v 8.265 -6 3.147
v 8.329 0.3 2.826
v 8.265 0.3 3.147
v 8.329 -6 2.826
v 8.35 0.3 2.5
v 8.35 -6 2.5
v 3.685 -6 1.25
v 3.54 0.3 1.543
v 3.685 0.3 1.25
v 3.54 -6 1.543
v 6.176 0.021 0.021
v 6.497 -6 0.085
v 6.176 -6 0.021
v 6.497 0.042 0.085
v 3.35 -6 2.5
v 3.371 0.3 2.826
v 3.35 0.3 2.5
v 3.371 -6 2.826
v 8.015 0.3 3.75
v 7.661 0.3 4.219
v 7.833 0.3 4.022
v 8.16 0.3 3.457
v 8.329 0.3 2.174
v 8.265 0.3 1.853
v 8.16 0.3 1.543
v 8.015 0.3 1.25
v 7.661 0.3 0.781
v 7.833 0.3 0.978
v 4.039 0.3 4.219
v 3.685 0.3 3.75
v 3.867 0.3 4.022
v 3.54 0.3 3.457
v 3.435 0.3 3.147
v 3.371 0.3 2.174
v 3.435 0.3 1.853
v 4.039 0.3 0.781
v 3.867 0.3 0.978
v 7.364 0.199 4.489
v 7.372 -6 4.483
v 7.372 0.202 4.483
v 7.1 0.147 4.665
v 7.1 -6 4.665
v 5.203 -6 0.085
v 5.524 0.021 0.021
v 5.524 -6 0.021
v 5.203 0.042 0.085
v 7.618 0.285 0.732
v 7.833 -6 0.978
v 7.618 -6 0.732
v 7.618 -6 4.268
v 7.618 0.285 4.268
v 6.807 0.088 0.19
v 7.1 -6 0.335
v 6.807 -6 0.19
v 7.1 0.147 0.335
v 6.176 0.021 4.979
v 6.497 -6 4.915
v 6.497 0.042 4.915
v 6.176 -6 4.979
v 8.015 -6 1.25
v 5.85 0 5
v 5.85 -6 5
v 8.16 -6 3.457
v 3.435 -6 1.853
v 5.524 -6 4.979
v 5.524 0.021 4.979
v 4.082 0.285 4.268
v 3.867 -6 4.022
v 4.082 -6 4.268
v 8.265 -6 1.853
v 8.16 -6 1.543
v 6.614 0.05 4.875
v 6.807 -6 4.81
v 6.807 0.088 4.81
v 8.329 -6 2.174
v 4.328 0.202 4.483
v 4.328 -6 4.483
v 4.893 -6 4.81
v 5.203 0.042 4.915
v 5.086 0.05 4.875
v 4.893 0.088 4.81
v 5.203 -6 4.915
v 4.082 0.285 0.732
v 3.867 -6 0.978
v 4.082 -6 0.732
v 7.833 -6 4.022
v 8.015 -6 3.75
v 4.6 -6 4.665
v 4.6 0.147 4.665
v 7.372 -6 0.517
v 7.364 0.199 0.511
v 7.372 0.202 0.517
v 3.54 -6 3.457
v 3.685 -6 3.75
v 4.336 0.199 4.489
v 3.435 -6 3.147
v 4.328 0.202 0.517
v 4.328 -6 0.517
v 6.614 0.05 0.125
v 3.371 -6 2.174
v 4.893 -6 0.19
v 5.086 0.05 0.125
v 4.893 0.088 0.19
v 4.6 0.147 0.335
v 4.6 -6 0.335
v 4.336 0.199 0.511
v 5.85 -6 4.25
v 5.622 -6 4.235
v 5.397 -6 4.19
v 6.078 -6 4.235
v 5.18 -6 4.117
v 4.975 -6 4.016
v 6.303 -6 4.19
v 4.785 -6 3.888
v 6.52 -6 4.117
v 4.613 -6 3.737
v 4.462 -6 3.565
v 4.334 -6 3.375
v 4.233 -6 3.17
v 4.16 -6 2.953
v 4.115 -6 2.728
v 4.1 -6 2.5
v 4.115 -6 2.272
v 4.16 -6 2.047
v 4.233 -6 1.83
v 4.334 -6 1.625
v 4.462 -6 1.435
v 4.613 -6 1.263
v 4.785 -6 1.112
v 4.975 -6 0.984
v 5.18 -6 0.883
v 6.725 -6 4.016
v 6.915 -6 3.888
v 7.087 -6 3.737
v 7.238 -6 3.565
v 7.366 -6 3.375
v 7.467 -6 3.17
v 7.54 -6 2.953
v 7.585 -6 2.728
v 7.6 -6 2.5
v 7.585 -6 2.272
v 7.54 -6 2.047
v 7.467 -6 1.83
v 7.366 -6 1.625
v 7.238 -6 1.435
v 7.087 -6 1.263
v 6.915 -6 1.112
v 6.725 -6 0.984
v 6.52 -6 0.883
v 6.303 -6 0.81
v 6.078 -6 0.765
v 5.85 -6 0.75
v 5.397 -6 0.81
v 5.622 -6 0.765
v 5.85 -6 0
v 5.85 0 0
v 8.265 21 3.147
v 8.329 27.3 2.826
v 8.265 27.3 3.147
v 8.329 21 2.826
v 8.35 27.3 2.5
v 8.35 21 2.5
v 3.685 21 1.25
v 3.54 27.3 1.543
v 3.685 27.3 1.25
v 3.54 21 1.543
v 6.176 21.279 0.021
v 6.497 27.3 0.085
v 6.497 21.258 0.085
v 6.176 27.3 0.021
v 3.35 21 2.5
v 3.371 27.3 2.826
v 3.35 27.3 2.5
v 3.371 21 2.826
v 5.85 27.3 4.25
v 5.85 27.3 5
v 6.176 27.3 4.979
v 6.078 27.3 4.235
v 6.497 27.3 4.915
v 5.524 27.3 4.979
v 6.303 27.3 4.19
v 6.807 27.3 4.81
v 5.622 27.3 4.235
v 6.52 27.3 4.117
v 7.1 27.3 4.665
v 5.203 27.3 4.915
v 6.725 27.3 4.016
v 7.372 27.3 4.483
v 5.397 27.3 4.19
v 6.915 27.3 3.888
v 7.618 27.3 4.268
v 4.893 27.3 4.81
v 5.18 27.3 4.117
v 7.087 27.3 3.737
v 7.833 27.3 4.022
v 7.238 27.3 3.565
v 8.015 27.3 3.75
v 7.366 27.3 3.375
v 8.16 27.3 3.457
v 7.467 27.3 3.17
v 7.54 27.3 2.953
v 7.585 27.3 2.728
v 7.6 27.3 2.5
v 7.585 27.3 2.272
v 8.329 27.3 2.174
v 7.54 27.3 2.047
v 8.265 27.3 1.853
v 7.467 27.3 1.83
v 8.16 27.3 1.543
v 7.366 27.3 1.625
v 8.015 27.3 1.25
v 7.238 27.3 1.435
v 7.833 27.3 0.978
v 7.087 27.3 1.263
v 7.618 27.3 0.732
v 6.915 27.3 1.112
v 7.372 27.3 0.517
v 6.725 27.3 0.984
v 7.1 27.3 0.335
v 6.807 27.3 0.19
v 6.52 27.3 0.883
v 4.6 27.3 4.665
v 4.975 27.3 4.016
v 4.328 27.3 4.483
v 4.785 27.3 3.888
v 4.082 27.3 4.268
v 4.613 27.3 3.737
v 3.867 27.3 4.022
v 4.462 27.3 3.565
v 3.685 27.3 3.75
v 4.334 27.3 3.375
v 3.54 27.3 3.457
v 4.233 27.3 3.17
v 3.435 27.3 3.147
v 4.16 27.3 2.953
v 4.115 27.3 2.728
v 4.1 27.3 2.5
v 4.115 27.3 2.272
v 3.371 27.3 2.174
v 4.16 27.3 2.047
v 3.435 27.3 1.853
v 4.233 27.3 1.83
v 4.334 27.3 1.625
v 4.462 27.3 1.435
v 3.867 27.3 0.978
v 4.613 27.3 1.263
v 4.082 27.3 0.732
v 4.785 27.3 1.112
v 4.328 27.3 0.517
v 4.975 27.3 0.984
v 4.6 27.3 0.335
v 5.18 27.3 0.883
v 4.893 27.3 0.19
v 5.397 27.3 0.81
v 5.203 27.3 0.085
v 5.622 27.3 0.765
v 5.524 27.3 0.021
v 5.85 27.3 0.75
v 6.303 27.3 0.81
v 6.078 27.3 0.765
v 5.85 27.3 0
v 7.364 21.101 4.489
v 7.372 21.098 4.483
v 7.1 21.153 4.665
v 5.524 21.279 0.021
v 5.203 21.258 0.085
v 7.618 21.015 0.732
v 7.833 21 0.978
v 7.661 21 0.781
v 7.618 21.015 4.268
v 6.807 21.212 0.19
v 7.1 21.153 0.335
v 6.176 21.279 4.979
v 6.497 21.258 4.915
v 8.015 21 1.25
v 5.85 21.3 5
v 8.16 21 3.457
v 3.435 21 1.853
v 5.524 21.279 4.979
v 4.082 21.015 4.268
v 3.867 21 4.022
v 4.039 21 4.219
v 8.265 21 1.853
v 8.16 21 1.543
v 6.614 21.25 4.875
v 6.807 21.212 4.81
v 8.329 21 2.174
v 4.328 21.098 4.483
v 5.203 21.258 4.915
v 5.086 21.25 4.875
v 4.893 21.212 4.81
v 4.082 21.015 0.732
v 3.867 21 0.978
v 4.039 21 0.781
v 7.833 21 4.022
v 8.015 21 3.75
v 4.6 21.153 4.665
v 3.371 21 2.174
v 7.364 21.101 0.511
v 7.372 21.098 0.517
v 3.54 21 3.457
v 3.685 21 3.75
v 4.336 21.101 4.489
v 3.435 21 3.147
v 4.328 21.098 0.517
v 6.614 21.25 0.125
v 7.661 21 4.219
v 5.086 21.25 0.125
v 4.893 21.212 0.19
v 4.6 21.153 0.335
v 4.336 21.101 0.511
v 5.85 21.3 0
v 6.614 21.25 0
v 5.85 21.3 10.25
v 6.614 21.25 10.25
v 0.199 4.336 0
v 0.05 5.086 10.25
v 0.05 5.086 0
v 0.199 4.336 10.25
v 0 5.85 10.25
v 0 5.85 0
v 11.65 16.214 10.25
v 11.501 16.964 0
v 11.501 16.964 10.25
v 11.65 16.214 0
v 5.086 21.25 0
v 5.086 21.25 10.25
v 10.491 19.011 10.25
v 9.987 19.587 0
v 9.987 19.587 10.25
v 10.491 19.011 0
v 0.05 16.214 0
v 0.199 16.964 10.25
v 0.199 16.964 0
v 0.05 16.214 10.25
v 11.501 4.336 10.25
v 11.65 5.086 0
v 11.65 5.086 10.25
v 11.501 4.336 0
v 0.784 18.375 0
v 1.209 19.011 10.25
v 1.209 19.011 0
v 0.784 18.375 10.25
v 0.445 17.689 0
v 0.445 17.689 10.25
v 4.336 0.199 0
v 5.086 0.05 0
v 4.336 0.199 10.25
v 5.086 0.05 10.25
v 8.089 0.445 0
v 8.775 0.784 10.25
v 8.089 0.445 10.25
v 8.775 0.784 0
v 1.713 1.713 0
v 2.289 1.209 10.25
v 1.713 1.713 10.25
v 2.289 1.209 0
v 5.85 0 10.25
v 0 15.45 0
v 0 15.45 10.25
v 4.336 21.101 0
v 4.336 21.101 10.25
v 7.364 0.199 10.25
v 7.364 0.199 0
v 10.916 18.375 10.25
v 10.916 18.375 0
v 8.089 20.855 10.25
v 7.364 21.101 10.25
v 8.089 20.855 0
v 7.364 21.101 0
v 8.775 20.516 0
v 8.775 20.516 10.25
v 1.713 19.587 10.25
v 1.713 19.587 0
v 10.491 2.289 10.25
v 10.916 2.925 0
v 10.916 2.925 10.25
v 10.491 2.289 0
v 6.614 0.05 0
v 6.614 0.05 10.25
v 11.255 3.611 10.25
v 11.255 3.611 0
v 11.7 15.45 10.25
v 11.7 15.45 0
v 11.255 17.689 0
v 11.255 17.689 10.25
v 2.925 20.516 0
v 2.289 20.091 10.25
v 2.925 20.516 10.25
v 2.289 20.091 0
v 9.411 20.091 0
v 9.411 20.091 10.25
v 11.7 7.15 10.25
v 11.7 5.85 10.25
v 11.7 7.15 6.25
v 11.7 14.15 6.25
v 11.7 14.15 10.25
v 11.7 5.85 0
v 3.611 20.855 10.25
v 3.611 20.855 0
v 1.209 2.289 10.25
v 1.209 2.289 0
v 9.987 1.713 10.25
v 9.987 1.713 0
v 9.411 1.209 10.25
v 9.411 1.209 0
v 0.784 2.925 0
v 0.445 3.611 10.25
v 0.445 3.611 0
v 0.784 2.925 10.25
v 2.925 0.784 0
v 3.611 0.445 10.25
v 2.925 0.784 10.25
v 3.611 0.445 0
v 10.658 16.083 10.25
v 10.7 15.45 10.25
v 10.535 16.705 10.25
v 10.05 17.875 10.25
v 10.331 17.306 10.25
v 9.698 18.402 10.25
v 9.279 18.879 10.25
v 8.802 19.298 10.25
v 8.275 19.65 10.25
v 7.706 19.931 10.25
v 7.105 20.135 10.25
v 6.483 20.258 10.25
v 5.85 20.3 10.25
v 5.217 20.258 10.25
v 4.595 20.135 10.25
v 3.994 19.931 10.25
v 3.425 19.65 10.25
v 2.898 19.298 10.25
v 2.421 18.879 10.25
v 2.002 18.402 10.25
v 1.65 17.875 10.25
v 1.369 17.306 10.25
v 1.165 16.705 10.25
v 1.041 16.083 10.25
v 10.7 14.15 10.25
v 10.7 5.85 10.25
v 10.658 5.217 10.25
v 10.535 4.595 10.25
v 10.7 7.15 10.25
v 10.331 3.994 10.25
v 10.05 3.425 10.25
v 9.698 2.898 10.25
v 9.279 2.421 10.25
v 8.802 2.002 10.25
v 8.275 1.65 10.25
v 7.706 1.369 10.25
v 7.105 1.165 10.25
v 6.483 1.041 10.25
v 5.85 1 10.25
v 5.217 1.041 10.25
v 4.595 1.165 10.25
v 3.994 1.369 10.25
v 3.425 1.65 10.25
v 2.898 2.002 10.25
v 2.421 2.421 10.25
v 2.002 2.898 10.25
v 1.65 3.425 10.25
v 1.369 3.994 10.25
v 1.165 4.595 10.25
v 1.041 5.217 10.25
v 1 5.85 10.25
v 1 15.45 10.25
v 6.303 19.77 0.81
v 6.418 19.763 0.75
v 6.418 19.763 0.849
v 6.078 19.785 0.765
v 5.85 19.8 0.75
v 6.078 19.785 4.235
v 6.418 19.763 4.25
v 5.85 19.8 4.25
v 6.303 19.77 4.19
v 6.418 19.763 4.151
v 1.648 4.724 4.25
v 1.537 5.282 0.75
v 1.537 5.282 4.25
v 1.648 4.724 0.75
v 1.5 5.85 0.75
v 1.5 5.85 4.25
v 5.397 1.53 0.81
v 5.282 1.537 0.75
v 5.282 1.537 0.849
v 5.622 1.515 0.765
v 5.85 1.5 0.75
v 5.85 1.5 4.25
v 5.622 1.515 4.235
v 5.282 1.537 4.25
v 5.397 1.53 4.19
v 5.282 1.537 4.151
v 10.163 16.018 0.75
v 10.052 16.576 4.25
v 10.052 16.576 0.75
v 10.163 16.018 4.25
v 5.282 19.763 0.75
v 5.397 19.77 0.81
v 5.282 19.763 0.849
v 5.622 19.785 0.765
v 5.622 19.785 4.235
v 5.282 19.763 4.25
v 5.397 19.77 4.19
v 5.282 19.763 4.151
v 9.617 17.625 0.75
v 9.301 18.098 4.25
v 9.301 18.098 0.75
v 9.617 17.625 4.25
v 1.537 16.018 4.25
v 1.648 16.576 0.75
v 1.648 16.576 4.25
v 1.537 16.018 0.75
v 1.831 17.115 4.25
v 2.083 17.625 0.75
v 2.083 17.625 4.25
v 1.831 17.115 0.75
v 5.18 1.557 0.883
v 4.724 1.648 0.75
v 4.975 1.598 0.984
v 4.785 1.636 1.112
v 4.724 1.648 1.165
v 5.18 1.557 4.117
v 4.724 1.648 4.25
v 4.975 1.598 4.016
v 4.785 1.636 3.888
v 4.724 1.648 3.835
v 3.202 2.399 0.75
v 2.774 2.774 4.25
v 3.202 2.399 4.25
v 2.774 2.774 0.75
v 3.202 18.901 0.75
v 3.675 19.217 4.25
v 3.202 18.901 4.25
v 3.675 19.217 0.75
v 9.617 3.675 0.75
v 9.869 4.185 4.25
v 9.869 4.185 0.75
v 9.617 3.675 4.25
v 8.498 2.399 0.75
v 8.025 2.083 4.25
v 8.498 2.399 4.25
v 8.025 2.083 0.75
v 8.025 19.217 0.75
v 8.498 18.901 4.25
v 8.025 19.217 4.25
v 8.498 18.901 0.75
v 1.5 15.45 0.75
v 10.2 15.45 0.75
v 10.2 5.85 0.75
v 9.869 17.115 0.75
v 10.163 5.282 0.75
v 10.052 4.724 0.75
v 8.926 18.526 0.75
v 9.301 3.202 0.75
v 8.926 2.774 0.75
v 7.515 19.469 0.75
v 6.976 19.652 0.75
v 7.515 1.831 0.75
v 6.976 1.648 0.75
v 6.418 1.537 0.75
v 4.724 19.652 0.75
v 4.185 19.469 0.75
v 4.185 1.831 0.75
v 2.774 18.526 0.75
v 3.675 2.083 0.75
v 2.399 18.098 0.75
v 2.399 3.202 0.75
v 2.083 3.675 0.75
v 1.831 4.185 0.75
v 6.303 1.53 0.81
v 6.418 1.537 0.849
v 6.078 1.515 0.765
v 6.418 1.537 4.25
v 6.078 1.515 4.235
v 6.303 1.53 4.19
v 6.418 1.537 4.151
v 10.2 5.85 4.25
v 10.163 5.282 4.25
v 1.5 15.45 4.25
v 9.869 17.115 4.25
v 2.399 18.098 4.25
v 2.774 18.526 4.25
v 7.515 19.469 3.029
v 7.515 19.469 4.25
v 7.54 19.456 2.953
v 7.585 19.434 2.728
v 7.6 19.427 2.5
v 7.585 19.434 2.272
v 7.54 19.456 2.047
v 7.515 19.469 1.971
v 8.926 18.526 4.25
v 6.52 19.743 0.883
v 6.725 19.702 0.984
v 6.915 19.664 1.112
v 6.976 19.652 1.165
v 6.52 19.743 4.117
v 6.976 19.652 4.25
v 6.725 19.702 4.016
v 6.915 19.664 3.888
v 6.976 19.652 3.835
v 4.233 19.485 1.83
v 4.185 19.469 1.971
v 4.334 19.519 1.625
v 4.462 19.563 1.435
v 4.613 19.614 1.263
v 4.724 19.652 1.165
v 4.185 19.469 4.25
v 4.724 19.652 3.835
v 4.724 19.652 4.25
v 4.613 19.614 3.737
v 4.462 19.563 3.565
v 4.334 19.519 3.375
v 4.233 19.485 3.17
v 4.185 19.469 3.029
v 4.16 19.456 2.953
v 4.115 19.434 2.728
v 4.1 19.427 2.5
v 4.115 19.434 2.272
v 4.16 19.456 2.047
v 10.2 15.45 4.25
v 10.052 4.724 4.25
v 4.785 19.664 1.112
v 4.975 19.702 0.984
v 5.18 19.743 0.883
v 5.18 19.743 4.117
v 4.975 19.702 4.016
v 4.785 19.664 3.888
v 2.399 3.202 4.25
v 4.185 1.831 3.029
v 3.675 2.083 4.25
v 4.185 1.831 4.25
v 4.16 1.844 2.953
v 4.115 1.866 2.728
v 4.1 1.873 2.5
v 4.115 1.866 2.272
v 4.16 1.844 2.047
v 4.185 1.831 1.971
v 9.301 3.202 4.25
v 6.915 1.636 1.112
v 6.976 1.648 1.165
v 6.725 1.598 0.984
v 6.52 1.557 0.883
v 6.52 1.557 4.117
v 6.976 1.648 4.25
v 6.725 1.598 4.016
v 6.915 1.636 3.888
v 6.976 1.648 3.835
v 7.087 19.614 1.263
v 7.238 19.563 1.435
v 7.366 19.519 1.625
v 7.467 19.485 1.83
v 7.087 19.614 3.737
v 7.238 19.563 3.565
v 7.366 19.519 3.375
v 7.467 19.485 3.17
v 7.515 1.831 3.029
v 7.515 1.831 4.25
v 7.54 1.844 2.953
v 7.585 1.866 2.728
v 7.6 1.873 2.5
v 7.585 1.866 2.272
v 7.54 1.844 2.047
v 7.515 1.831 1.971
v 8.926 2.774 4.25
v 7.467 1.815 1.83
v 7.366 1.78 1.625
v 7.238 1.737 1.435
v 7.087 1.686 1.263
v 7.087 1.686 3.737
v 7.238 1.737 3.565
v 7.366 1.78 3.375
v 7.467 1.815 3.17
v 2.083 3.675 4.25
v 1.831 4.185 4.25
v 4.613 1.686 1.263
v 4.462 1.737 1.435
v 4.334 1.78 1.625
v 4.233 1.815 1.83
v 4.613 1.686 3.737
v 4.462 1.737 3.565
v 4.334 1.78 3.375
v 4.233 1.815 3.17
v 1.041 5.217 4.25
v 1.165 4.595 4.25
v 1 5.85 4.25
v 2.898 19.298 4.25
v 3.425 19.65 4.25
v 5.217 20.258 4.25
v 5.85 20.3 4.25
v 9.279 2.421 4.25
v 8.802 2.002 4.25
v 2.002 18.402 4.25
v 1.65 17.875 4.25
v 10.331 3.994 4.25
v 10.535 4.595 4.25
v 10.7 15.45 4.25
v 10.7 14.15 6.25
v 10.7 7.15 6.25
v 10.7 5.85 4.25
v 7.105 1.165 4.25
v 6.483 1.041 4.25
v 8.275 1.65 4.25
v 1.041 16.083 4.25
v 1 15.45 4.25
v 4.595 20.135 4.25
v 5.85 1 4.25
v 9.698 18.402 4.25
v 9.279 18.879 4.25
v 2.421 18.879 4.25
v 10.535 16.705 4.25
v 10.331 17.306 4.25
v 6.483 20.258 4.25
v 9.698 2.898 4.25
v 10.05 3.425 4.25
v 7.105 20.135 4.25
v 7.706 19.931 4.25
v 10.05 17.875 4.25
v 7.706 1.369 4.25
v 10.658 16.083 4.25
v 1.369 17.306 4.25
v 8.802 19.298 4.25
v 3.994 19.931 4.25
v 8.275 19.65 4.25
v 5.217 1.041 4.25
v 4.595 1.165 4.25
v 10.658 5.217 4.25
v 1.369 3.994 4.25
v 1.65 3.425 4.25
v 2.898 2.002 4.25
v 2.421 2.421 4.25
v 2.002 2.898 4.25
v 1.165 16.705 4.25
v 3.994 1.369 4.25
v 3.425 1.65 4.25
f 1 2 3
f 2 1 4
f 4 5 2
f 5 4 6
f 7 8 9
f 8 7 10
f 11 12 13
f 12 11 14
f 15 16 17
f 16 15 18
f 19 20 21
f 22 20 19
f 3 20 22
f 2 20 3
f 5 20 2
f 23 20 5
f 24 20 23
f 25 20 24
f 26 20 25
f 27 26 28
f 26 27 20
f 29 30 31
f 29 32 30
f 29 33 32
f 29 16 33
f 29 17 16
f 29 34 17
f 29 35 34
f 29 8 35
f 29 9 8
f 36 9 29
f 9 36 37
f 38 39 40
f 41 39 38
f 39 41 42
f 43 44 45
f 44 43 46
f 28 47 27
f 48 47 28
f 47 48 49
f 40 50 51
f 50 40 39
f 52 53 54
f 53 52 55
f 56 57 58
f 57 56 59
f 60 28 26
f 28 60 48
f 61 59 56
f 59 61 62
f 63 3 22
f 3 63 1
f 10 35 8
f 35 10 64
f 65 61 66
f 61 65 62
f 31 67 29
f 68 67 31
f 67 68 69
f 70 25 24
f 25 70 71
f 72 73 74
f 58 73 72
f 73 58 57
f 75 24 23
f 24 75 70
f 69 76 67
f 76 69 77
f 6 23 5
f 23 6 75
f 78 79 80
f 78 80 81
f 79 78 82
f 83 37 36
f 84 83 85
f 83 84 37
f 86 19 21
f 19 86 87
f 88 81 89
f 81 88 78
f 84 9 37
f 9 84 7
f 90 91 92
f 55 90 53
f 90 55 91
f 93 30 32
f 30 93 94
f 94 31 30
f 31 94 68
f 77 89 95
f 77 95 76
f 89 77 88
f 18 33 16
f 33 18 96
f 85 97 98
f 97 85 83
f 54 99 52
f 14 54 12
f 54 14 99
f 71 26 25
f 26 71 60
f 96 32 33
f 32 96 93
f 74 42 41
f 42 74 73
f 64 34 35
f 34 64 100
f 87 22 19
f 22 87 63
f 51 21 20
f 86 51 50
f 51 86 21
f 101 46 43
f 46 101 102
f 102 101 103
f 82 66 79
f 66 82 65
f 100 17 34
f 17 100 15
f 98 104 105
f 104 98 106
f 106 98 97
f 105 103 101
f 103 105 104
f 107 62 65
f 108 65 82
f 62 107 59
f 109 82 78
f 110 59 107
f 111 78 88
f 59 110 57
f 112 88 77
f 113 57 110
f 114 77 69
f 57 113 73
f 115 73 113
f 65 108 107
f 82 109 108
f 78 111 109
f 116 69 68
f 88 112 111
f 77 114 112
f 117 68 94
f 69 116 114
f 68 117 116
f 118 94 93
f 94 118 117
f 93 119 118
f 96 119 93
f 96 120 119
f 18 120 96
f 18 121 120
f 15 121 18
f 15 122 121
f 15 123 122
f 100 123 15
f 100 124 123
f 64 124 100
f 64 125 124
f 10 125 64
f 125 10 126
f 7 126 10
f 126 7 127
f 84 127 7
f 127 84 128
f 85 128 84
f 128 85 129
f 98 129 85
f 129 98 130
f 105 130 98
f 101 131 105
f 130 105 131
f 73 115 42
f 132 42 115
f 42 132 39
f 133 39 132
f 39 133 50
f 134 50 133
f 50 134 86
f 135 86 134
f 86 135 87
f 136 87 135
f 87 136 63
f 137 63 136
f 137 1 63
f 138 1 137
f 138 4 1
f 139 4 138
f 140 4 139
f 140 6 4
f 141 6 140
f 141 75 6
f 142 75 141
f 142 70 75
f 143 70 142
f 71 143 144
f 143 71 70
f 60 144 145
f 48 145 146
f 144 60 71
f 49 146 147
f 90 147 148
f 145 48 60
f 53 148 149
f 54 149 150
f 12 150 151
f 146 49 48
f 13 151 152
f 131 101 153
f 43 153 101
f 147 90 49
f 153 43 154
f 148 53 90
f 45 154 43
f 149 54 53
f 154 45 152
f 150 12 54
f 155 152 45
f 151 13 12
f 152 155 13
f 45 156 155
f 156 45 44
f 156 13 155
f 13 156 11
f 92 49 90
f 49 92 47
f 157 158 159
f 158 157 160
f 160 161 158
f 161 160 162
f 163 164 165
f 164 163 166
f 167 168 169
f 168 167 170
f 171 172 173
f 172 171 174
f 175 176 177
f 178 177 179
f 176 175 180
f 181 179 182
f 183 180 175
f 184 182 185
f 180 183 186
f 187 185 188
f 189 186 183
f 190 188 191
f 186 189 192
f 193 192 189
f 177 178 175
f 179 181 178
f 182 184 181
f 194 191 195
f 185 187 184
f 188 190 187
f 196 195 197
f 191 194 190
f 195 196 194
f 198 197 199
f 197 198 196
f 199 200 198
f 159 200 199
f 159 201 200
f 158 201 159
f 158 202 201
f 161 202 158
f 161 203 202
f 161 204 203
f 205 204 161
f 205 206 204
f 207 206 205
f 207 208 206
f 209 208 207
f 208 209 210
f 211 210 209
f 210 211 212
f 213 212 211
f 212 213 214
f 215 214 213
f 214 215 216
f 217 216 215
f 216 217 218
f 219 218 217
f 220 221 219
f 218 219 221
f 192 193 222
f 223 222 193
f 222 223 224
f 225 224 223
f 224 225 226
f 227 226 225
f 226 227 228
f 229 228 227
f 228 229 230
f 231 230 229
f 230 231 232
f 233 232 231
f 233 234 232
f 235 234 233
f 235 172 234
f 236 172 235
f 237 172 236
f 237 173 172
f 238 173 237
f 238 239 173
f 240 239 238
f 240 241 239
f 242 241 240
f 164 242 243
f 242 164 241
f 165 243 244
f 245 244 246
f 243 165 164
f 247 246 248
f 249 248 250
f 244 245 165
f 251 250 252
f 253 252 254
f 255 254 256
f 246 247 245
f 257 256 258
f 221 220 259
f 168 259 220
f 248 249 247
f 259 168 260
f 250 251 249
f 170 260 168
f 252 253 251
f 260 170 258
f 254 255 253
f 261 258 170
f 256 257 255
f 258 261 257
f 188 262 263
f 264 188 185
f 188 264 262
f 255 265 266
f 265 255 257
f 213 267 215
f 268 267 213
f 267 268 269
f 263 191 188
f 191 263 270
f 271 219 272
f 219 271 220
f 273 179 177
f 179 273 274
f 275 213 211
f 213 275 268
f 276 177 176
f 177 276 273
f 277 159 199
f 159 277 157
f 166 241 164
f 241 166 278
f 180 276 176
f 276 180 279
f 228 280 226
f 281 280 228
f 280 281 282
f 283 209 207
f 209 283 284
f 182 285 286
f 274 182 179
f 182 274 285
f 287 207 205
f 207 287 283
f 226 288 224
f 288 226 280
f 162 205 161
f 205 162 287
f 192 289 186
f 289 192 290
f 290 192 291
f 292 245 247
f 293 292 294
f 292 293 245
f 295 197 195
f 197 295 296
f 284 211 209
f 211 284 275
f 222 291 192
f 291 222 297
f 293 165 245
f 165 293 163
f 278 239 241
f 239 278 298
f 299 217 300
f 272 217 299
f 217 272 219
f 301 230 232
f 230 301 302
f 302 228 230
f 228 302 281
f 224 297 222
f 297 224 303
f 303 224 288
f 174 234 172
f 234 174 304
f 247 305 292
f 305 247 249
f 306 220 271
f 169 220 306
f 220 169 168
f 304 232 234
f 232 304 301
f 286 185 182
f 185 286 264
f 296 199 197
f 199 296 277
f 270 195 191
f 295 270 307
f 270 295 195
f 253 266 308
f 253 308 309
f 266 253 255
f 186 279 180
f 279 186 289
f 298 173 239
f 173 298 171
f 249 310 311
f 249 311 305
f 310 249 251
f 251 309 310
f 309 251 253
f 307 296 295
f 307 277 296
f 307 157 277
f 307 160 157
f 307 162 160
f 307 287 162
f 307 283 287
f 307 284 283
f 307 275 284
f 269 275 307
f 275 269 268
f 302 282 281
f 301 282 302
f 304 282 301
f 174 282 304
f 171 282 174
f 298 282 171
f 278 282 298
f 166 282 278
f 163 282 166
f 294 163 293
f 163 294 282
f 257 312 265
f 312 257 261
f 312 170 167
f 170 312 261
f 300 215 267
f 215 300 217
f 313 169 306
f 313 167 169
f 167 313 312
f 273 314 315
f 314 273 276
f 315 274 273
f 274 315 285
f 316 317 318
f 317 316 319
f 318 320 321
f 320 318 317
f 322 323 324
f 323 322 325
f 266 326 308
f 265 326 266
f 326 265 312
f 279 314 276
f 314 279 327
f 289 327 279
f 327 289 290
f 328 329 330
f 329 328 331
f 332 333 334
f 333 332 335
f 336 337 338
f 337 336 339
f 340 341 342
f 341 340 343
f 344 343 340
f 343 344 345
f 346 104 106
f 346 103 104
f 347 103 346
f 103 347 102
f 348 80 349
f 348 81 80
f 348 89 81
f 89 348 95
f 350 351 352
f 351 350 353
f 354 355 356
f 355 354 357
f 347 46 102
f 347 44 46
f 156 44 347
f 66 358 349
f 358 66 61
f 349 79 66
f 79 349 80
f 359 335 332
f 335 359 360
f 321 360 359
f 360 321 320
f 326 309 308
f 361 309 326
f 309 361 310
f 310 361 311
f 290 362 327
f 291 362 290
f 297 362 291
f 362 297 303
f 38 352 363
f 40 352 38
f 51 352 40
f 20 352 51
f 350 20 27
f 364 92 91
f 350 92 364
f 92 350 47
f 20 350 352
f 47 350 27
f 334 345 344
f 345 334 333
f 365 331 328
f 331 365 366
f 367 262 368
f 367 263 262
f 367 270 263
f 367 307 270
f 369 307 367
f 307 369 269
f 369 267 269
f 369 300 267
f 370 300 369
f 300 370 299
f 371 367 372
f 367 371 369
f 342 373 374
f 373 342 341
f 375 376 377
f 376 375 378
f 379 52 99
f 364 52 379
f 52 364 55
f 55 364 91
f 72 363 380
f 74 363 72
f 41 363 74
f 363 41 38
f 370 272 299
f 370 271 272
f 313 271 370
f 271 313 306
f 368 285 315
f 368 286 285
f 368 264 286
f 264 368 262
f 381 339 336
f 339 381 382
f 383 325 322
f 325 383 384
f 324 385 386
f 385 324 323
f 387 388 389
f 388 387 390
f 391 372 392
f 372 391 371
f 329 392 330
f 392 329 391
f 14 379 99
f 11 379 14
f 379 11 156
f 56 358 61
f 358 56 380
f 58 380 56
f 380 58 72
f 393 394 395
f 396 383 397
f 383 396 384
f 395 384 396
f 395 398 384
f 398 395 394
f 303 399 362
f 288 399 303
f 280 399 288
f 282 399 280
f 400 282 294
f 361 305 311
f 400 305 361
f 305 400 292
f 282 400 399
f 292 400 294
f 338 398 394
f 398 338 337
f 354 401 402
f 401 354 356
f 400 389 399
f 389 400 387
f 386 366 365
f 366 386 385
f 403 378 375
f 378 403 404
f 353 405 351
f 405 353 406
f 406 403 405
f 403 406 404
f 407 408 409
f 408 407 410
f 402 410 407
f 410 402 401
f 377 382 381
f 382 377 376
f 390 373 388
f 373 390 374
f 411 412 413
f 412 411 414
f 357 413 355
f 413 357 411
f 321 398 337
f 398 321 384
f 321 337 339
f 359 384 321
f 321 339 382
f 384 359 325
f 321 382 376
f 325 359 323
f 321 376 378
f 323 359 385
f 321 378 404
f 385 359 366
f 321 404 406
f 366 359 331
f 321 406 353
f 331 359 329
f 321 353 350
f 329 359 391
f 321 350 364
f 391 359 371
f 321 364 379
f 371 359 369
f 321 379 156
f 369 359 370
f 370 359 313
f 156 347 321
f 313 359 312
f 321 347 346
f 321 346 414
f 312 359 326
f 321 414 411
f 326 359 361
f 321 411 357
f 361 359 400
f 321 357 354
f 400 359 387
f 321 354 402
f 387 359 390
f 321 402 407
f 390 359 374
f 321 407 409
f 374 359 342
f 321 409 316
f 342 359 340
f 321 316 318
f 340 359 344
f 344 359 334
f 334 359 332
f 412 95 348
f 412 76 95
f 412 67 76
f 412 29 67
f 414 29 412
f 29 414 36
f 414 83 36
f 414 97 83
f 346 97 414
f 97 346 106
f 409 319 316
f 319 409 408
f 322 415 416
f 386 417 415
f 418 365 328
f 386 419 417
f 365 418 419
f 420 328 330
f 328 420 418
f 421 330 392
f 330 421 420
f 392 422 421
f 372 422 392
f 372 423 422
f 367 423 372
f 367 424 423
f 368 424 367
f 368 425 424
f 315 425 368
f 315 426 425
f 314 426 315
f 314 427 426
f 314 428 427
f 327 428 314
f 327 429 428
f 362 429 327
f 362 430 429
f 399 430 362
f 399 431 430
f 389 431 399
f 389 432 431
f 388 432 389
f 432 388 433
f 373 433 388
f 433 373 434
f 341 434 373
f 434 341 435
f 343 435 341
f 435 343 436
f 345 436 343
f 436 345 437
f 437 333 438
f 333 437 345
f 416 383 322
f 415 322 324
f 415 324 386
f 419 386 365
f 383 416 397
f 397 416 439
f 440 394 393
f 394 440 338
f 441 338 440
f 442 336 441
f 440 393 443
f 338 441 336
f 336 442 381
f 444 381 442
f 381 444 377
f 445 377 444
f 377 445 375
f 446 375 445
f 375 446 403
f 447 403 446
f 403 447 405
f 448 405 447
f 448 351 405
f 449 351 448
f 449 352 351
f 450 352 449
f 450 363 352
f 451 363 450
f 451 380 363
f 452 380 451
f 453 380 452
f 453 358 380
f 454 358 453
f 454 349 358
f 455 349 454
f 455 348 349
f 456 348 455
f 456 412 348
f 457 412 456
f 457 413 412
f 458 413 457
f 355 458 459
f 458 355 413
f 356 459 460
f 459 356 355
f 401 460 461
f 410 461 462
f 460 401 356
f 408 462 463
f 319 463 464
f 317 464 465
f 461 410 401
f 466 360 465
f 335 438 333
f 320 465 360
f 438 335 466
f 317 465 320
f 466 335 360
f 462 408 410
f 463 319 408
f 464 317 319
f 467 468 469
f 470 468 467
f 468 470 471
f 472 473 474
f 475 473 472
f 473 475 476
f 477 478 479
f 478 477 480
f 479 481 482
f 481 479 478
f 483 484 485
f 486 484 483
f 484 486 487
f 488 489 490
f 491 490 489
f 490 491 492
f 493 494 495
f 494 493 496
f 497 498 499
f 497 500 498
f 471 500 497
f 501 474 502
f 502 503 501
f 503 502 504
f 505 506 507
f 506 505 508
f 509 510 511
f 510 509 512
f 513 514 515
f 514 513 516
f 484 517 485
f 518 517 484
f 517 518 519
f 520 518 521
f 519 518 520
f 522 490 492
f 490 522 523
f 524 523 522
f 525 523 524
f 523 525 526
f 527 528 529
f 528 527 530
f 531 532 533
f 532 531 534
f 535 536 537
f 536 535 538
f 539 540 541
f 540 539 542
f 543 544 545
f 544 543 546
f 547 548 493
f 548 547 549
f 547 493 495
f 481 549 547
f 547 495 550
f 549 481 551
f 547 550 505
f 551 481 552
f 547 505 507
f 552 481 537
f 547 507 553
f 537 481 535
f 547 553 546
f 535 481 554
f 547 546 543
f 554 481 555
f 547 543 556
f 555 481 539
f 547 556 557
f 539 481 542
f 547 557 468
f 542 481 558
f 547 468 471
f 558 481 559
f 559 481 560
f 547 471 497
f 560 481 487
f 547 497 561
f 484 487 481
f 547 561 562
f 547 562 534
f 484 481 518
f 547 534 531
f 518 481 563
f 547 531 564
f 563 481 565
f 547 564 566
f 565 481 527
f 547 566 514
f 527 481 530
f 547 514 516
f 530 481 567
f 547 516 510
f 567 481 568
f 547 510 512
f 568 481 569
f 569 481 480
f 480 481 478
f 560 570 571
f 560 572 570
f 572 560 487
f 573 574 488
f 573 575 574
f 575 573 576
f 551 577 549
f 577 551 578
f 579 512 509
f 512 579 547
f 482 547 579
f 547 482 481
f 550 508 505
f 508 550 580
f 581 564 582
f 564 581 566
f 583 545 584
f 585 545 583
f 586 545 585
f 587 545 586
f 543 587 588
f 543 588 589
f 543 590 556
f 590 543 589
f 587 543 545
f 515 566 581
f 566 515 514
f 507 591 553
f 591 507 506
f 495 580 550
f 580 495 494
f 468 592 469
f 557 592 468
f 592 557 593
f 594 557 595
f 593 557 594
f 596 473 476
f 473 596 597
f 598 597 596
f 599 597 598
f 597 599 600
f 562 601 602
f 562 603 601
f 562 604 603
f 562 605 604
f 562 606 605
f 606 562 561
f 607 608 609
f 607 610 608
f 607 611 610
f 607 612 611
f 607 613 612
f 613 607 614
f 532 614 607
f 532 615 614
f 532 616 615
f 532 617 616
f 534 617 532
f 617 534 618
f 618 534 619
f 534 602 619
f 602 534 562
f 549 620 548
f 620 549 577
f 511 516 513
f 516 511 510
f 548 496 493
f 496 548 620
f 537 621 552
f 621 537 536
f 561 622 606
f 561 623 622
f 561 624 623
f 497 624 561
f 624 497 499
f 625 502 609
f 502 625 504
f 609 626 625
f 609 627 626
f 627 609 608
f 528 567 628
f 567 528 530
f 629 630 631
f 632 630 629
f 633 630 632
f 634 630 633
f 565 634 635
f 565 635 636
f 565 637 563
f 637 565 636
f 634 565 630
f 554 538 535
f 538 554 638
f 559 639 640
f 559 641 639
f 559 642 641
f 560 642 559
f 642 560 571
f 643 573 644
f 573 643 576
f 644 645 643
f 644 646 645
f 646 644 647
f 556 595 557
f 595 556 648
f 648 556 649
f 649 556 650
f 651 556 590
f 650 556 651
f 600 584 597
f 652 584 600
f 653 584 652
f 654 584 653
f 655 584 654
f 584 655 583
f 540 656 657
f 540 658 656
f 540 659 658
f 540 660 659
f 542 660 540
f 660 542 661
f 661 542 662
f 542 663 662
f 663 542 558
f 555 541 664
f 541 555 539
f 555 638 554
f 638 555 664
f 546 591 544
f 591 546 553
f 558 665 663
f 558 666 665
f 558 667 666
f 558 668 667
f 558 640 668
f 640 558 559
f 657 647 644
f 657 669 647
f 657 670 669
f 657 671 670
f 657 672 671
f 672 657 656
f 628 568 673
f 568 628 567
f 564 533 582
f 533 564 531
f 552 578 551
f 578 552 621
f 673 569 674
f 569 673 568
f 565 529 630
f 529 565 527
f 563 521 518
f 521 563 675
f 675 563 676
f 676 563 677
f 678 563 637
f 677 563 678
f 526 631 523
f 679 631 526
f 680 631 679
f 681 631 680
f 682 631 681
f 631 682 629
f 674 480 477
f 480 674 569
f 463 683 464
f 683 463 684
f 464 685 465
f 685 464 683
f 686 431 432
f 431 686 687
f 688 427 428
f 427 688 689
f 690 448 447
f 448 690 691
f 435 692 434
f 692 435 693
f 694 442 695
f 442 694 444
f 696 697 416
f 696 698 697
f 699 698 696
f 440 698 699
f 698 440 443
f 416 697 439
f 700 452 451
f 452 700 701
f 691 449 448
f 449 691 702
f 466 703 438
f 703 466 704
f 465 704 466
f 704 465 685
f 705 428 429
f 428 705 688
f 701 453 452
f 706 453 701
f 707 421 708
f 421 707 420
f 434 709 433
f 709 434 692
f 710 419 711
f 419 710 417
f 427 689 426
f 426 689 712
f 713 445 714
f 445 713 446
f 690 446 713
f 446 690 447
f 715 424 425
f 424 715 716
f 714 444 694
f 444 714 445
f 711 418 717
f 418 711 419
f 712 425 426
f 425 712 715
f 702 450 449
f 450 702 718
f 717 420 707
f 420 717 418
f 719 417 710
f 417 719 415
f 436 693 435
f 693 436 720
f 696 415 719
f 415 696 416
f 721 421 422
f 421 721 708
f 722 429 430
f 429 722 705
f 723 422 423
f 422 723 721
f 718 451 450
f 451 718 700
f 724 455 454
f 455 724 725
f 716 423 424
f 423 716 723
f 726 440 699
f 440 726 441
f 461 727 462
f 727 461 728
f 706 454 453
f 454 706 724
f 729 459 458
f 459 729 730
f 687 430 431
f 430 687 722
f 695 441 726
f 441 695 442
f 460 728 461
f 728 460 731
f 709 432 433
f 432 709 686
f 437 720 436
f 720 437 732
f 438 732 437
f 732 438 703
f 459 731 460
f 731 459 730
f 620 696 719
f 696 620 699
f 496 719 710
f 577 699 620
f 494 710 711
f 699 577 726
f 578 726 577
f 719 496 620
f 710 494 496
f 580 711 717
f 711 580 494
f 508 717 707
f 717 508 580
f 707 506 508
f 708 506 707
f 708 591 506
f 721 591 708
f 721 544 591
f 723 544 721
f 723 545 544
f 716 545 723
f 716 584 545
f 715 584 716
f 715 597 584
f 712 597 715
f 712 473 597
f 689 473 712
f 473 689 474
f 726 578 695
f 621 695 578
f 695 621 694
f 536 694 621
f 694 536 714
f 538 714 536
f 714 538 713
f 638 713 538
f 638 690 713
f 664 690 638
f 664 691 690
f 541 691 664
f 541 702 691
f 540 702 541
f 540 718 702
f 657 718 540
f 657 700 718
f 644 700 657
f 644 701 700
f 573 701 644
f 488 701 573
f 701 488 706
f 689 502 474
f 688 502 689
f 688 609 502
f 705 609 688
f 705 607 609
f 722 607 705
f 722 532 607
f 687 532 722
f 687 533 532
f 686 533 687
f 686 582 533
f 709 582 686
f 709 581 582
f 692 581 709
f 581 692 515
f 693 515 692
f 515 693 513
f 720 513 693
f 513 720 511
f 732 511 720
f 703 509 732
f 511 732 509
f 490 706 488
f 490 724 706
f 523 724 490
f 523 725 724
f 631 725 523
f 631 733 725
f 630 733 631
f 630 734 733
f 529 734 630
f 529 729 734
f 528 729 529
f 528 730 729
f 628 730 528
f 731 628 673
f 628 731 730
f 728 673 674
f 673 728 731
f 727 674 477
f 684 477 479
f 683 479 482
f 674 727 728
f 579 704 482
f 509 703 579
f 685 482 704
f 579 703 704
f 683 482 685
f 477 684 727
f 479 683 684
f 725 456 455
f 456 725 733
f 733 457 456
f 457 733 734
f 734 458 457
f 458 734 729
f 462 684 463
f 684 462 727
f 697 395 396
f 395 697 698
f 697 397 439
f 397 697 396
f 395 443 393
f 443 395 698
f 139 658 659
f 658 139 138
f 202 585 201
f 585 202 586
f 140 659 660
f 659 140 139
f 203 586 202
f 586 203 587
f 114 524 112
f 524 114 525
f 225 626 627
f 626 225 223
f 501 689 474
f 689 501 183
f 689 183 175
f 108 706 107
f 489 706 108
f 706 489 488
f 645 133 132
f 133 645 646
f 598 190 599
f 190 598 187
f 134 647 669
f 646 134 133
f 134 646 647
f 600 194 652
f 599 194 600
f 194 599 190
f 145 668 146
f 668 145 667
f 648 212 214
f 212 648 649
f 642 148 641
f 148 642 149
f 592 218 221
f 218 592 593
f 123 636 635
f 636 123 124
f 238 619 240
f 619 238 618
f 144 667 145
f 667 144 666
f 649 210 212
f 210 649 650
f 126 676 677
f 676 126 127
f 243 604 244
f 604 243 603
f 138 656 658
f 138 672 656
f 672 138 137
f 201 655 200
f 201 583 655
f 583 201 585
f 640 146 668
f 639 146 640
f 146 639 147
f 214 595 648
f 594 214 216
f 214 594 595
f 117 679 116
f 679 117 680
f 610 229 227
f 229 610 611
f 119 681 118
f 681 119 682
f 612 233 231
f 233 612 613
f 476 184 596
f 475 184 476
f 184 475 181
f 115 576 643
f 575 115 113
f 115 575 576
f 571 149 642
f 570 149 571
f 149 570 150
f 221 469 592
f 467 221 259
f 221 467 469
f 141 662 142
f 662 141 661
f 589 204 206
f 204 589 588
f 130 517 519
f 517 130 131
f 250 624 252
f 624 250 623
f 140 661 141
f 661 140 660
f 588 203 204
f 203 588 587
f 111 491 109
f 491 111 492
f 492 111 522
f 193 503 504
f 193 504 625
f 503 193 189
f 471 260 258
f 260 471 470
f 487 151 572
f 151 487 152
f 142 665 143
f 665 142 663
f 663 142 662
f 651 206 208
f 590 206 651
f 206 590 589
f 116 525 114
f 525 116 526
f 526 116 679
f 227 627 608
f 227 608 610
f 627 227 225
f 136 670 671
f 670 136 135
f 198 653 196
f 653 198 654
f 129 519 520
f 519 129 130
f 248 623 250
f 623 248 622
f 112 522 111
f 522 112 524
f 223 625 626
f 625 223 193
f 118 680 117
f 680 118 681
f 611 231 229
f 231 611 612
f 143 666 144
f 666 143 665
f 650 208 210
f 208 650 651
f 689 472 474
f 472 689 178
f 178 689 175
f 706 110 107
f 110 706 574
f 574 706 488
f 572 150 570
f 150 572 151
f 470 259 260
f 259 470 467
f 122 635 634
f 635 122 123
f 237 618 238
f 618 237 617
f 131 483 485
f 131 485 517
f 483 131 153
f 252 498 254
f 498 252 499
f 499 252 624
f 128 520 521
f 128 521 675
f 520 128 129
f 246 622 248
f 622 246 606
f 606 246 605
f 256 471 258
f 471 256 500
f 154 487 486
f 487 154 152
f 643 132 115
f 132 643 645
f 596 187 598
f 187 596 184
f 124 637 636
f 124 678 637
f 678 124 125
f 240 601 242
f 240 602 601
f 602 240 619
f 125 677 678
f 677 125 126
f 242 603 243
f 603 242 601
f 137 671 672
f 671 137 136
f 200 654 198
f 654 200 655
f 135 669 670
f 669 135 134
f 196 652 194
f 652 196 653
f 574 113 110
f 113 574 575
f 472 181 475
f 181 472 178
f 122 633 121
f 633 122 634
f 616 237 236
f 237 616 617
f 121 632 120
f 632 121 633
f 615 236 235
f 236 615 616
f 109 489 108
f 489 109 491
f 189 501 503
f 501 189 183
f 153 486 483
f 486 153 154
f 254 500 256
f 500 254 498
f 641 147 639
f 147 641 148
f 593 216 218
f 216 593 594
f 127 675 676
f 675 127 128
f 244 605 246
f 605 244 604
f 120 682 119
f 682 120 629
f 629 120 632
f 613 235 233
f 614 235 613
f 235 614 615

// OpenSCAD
// Shallow flow chamber for the flat face of the helium sensor.
// The sensor face closes the open chamber side; gas flows across the whole face.
he_sensor_face_width = 9.7; // Sensor face width.
he_sensor_face_length = 19.3; // Sensor face length.
he_sensor_corner_diameter = he_sensor_face_width; // Diameter defining the rounded ends/corners.
sensor_body_clearance = 0; // Side clearance between the sensor body and retaining collar if needed
sensor_seat_overlap = 0.5; // Per-side ledge supporting the sensor face around the flow opening.
sensor_retainer_height = 6; // Collar height above the chamber that grips the sensor sides.
thermal_sensor_cutout_width = 7; // Opening width along the holder's long side.
thermal_sensor_cutout_start_above_collar = 2; // Opening starts this far above the collar base.

holder_wall = 1; // Wall thickness around the sensor face.
closed_end_thickness = 0.75; // Thickness of the chamber's closed back.
plenum_depth = 3.5; // Gap between the sensor face and the chamber back.

// Smooth spigots are provisional; size them to the flexible tubing.
tube_bore_diameter = 3.5; // Inside diameter of the tube ports and spigots.
tube_spigot_diameter = 5; // Outside diameter of each tube spigot.
tube_spigot_length = 6; // Length of each spigot beyond the holder end.
spigot_overlap = 0.3; // Amount each spigot overlaps the holder for a strong union.

chamber_width = he_sensor_face_width - 2 * sensor_seat_overlap; // Derived flow-opening width.
chamber_length = he_sensor_face_length - 2 * sensor_seat_overlap; // Derived flow-opening length.
chamber_corner_diameter = he_sensor_corner_diameter - 2 * sensor_seat_overlap; // Derived opening corner size.
sensor_cavity_width = he_sensor_face_width + 2 * sensor_body_clearance; // Derived collar opening width.
sensor_cavity_length = he_sensor_face_length + 2 * sensor_body_clearance; // Derived collar opening length.
sensor_cavity_corner_diameter = he_sensor_corner_diameter + 2 * sensor_body_clearance; // Derived collar opening corner size.
outer_width = he_sensor_face_width + 2 * holder_wall; // Derived holder outside width.
outer_length = he_sensor_face_length + 2 * holder_wall; // Derived holder outside length.
outer_corner_diameter = he_sensor_corner_diameter + 2 * holder_wall; // Derived holder corner size.
port_center_z = closed_end_thickness + plenum_depth / 2; // Tube-bore center height within the plenum.

module rounded_rectangle_2d(width, length, corner_diameter) {
    corner_radius = corner_diameter / 2;
    hull()
        for (y = [corner_radius, length - corner_radius])
            translate([width / 2, y]) circle(r = corner_radius, $fn = 48);
}

module rounded_rectangle_prism(width, length, corner_diameter, height) {
    linear_extrude(height = height)
        rounded_rectangle_2d(width, length, corner_diameter);
}

module he_sensor_holder() {
    difference() {
        union() {
            rounded_rectangle_prism(outer_width, outer_length, outer_corner_diameter,
                                    closed_end_thickness + plenum_depth);

            // Raised collar surrounds the sensor body above the gas chamber.
            translate([0, 0, closed_end_thickness + plenum_depth])
                rounded_rectangle_prism(outer_width, outer_length, outer_corner_diameter,
                                        sensor_retainer_height);

            // Inlet and outlet connect to opposite ends of the shallow chamber.
            for (side = [-1, 1])
                translate([outer_width / 2,
                           side < 0
                               ? -tube_spigot_length / 2 + spigot_overlap / 2
                               : outer_length + tube_spigot_length / 2 - spigot_overlap / 2,
                           port_center_z])
                    rotate([90, 0, 0])
                        cylinder(h = tube_spigot_length + spigot_overlap,
                                 d = tube_spigot_diameter, center = true, $fn = 48);
        }

        // Full-face plenum; the sensor face closes this opening when installed.
        translate([(outer_width - chamber_width) / 2,
               (outer_length - chamber_length) / 2,
                   closed_end_thickness])
            rounded_rectangle_prism(chamber_width, chamber_length,
                                    chamber_corner_diameter, plenum_depth + 0.1);

            // Sensor body slides through this collar opening and rests on the chamber ledge.
            translate([(outer_width - sensor_cavity_width) / 2,
                   (outer_length - sensor_cavity_length) / 2,
                   closed_end_thickness + plenum_depth])
                rounded_rectangle_prism(sensor_cavity_width, sensor_cavity_length,
                            sensor_cavity_corner_diameter, sensor_retainer_height + 0.1);

              // Side window lets a glued thermal sensor contact the helium sensor body.
              thermal_cutout_inner_x = (outer_width + sensor_cavity_width) / 2 - 0.1;
              translate([thermal_cutout_inner_x,
                     (outer_length - thermal_sensor_cutout_width) / 2,
                     closed_end_thickness + plenum_depth + thermal_sensor_cutout_start_above_collar])
                cube([outer_width - thermal_cutout_inner_x + 0.2,
                    thermal_sensor_cutout_width, sensor_retainer_height]);

        // Continuous round bore links both tube spigots across the sensor face.
        translate([outer_width / 2, outer_length / 2, port_center_z])
            rotate([90, 0, 0])
                cylinder(h = outer_length + 2 * tube_spigot_length + 1,
                         d = tube_bore_diameter, center = true, $fn = 48);
    }
}

he_sensor_holder();
